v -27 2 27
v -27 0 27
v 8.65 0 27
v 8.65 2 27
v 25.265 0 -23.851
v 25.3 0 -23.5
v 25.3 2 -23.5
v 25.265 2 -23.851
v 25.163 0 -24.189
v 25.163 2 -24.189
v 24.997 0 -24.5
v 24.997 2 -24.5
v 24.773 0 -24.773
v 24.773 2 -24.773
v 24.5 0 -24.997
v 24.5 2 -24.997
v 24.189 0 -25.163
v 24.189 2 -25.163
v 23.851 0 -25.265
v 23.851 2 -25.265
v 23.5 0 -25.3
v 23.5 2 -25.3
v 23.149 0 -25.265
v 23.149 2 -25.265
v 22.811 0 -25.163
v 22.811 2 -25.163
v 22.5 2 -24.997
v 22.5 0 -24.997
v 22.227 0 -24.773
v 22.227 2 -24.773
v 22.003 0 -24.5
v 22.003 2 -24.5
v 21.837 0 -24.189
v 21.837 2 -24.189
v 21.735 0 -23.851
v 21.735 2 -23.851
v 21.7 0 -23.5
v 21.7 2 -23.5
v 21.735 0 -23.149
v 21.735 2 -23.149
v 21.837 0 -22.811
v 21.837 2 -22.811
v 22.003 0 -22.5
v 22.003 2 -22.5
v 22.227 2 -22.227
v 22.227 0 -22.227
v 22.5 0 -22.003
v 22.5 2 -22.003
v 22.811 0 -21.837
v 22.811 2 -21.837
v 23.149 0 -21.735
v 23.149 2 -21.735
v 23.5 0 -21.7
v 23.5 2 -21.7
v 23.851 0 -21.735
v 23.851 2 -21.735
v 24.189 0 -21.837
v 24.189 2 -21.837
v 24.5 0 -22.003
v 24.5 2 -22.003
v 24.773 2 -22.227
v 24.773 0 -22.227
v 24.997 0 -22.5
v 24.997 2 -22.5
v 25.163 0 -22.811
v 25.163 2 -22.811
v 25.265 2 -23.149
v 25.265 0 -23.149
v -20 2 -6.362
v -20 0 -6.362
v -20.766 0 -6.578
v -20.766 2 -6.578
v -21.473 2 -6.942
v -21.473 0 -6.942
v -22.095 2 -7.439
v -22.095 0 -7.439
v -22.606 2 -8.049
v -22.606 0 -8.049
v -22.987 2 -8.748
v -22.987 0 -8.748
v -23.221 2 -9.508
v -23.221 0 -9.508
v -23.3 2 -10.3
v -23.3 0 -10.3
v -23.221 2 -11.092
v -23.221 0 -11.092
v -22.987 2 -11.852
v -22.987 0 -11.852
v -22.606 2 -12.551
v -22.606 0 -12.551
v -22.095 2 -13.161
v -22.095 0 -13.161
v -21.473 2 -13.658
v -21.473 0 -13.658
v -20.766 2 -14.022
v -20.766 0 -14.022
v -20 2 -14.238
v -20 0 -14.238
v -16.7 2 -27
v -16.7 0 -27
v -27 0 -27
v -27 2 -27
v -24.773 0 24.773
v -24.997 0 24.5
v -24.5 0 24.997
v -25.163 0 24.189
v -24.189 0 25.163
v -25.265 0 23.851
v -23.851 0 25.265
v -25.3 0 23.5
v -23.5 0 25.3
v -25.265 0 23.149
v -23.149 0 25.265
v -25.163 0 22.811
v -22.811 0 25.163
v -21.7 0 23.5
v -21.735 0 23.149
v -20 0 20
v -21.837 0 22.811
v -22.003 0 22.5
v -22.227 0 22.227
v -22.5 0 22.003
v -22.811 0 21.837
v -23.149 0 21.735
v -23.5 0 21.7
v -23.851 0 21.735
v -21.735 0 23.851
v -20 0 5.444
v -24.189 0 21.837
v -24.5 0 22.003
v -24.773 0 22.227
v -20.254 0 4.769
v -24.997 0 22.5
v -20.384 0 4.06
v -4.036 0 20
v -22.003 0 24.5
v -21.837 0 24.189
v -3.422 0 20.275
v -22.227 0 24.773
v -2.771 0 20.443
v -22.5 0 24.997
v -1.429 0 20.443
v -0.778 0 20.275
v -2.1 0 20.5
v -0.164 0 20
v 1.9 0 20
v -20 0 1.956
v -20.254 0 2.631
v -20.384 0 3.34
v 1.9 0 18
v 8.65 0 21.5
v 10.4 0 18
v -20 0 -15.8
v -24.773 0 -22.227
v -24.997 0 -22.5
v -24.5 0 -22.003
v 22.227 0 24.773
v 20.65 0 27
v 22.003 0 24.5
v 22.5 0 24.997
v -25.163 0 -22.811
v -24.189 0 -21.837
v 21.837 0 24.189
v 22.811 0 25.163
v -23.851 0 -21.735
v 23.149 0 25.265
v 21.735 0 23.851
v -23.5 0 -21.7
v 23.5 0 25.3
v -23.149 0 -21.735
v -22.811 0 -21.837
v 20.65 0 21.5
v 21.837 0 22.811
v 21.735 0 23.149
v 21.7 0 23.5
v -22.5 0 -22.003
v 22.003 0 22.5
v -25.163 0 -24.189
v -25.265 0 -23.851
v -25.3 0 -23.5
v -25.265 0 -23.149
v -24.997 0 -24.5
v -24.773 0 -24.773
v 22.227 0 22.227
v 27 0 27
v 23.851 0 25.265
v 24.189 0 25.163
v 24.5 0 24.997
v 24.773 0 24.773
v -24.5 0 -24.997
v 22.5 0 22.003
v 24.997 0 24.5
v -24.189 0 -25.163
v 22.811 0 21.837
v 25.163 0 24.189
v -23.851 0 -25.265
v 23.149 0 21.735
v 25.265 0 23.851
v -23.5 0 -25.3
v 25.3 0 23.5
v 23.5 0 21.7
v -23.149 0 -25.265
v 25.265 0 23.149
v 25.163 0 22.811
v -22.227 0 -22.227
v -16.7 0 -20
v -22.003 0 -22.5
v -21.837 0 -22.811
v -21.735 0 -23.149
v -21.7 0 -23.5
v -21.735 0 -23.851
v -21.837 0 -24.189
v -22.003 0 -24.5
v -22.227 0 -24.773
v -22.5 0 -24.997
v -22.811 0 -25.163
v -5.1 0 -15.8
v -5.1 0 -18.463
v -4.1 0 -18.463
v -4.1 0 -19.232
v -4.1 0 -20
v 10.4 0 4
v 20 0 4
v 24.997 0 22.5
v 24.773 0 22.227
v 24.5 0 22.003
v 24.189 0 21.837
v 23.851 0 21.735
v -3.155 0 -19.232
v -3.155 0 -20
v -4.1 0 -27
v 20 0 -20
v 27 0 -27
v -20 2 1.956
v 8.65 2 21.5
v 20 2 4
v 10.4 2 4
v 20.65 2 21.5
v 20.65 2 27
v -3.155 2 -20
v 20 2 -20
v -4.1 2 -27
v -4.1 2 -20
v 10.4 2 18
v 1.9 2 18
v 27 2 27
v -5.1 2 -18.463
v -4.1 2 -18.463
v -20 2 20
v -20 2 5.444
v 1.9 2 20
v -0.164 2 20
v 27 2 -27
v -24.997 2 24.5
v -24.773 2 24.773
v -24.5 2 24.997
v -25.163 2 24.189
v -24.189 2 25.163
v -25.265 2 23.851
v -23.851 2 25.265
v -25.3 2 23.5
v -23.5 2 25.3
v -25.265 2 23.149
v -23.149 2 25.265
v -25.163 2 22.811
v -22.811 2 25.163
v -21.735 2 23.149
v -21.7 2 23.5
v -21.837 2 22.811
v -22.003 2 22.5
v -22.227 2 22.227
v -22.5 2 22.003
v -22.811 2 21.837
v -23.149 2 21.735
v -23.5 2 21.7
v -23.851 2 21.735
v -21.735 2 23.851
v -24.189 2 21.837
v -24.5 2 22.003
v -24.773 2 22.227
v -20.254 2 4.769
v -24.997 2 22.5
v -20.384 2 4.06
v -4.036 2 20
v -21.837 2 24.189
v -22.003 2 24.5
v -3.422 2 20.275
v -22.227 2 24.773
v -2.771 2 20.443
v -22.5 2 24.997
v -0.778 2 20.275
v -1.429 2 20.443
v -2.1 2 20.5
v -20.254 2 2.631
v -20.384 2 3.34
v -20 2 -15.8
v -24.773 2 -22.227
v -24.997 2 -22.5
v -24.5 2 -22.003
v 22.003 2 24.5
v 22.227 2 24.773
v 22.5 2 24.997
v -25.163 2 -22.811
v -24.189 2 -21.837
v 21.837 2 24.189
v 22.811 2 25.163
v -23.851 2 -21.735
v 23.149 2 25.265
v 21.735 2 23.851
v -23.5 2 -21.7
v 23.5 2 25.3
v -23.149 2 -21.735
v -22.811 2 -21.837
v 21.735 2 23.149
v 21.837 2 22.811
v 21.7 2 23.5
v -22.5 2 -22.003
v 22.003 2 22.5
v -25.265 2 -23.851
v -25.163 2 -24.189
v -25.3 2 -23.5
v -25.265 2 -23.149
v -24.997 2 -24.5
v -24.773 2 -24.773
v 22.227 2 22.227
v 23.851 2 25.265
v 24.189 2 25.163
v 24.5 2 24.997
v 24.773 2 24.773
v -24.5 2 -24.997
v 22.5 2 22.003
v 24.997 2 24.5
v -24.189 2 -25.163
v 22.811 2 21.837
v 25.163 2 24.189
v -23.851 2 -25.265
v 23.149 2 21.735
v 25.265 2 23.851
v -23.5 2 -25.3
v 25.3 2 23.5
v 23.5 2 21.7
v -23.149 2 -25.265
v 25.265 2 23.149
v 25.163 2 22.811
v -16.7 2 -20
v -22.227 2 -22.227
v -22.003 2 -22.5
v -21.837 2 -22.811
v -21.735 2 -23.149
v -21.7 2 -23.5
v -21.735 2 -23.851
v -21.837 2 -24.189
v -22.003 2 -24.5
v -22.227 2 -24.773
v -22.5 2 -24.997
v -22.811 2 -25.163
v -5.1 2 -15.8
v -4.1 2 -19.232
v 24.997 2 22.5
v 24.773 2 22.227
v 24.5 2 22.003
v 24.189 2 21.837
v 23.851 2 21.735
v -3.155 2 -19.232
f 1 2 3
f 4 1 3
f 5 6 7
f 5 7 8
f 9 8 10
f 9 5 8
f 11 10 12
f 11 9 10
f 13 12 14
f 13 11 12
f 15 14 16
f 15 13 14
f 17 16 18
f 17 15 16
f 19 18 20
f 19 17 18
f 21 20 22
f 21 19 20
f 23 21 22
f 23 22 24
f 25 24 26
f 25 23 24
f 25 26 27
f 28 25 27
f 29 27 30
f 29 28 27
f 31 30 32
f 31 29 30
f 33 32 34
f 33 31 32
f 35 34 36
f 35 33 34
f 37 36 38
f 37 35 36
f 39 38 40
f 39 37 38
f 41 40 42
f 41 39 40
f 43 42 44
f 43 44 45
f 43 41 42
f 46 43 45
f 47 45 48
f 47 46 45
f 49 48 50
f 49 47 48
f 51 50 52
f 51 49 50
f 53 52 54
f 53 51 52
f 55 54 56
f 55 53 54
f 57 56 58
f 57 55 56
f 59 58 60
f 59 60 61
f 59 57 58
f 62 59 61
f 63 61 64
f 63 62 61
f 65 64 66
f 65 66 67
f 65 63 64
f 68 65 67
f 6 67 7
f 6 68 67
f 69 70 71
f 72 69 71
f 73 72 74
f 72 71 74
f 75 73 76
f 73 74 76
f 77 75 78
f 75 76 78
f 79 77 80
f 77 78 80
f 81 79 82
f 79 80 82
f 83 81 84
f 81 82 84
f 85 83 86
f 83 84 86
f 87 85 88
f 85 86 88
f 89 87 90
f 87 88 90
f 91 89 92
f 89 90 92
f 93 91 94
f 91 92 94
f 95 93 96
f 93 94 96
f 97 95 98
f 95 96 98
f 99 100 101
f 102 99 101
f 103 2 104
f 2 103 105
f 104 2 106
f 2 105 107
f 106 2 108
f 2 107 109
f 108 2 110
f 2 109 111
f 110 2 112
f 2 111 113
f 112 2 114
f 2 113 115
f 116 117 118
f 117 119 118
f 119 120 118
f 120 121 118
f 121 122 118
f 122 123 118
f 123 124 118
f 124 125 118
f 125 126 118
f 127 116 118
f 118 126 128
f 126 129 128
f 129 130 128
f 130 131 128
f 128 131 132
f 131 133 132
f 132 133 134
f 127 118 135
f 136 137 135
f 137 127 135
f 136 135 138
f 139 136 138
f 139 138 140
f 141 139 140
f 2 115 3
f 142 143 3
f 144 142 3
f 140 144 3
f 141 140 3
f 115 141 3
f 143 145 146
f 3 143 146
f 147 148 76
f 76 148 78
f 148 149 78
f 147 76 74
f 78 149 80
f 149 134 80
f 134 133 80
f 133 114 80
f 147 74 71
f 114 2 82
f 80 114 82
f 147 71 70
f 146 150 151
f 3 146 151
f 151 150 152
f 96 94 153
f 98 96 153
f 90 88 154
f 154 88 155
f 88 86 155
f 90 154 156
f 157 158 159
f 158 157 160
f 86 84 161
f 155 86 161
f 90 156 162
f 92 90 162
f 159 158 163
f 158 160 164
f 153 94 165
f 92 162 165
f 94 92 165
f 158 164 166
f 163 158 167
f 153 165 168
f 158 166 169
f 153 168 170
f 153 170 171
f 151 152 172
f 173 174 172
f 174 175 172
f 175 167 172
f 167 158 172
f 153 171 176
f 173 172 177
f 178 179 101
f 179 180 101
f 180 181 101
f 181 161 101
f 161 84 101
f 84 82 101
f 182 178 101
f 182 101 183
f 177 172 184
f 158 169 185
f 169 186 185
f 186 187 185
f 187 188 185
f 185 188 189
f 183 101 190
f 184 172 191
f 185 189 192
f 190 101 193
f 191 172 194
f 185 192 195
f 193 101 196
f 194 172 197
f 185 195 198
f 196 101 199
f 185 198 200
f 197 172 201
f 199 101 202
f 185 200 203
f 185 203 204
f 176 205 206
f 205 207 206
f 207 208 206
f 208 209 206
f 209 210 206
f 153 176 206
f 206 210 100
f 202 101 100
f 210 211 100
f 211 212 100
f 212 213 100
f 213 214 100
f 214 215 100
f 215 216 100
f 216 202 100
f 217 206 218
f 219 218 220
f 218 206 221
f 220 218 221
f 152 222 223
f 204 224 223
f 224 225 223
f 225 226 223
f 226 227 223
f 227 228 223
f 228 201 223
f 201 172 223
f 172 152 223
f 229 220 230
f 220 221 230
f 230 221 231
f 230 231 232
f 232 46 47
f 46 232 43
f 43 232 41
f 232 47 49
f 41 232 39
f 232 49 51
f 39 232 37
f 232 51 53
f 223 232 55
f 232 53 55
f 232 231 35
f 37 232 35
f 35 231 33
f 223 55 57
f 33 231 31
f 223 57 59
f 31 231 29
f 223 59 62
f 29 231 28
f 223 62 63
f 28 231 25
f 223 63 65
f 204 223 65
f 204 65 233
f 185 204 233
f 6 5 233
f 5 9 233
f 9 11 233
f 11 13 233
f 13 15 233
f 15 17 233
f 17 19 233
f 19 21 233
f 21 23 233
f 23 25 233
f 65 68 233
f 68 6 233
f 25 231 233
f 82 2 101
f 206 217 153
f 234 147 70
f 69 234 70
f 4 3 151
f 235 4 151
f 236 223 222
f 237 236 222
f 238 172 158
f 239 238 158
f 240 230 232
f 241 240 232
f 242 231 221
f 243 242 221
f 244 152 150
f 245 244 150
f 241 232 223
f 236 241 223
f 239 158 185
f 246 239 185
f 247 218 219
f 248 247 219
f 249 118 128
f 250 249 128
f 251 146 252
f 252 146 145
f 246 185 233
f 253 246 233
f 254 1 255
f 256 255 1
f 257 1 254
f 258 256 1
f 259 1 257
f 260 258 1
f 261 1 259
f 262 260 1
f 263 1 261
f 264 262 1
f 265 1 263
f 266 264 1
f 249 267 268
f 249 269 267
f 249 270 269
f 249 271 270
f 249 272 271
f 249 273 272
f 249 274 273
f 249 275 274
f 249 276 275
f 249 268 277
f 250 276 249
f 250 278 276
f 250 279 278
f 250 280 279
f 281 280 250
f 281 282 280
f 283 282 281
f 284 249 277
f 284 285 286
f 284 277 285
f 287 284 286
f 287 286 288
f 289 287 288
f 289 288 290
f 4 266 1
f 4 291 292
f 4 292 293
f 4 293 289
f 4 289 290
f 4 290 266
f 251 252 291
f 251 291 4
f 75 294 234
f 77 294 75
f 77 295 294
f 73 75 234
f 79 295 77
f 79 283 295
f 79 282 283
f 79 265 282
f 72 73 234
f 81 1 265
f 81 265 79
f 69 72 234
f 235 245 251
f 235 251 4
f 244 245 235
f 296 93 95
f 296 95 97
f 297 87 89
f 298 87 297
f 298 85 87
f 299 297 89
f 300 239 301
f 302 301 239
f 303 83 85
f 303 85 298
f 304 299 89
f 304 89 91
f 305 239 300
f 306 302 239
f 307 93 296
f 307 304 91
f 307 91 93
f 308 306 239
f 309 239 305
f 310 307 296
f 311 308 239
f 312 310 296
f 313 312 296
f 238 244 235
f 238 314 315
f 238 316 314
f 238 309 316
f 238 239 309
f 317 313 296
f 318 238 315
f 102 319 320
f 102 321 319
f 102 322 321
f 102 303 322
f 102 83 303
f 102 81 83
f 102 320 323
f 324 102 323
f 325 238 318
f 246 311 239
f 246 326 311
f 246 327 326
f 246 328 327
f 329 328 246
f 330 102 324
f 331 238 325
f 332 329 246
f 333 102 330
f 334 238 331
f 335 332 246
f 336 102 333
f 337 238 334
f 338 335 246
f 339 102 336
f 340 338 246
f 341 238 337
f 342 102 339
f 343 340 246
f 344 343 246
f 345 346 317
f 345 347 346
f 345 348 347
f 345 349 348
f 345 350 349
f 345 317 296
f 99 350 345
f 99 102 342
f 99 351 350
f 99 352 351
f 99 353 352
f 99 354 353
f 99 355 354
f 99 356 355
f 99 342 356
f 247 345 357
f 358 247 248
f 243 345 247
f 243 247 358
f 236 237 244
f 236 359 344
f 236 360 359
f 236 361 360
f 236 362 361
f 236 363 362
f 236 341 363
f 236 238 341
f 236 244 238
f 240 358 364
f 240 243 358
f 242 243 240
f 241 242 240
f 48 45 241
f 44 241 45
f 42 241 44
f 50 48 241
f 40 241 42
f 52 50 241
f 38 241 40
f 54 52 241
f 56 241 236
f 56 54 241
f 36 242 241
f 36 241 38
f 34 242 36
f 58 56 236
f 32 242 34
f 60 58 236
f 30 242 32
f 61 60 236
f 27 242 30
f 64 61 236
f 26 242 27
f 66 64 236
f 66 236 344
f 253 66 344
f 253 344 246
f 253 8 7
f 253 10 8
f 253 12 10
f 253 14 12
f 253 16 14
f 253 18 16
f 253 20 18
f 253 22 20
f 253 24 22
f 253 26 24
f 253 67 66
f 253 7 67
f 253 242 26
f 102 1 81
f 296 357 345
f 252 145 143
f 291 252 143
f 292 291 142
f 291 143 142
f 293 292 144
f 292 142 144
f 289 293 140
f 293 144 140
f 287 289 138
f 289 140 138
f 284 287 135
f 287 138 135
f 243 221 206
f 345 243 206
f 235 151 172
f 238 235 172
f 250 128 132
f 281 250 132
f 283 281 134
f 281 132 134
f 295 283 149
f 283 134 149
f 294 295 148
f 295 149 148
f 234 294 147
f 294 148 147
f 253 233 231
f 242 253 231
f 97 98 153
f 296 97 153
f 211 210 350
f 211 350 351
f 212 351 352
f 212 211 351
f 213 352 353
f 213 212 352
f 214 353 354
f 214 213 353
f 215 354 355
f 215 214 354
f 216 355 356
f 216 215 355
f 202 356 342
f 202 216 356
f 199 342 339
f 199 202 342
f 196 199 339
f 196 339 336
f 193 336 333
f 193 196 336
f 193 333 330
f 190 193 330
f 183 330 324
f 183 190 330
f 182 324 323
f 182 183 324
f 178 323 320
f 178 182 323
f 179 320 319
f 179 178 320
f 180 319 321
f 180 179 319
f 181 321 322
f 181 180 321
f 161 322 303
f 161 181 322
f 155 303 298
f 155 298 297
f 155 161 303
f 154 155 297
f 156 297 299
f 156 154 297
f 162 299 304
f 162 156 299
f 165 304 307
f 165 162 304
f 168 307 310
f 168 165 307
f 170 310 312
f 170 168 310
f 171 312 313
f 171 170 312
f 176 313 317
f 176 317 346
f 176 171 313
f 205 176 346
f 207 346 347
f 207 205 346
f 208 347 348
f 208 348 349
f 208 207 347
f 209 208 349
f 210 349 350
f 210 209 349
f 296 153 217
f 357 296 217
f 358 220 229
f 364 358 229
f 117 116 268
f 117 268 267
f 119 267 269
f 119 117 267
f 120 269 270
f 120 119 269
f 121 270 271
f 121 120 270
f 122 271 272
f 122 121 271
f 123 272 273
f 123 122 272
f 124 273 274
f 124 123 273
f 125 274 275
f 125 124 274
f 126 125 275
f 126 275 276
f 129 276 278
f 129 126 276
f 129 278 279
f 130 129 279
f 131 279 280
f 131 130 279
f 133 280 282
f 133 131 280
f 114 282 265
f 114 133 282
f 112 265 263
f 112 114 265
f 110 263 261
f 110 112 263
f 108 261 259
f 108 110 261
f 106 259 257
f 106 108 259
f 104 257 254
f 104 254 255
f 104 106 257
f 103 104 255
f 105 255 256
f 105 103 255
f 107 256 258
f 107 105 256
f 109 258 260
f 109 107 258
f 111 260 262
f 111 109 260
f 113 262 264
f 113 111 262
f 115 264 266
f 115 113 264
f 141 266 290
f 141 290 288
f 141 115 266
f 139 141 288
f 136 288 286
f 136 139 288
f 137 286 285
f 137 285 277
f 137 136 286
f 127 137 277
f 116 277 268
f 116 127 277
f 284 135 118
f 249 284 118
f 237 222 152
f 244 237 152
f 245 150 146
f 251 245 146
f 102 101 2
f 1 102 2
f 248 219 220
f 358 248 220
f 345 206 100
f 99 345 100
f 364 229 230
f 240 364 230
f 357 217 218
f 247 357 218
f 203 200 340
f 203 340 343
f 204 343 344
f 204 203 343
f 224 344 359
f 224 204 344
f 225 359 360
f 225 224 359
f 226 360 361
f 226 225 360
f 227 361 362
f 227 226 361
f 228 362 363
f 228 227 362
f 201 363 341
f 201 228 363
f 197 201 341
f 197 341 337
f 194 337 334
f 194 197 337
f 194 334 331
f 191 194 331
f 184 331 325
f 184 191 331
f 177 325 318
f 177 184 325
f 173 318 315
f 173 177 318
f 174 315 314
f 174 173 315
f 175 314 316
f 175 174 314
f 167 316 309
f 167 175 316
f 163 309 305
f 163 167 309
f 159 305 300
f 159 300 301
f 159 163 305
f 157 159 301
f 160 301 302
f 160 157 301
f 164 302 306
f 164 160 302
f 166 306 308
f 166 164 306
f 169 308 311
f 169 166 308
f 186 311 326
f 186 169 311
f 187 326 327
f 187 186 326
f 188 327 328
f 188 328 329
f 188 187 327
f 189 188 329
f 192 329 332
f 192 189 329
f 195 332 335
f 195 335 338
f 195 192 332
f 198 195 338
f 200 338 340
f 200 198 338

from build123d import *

# Parameters (mm, degrees)
SKETCH_3_R      = 1.8
SKETCH_3_W      = 0.8
SKETCH_3_H      = 1.5
SKETCH_3_W_2    = 1
SKETCH_3_W_3    = 0.944853381
SKETCH_3_H_2    = 0.76832805
EXTRUDE_2_DEPTH = 2


with BuildPart() as part:
    # 草图3 → 凸台-拉伸2 (new body)
    with BuildSketch(Plane(origin=(0, 0, 0), x_dir=(1, 0, 0), z_dir=(0, 1, 0))):
        with BuildLine():
            Line((8.65, -27), (8.65, -21.5))
            Line((8.65, -21.5), (8.65, -20))
            Line((8.65, -20), (1.9, -20))
            Line((1.9, -20), (-0.163508327, -20))
            ThreePointArc((-0.163508327, -20), (-2.1, -20.5), (-4.036491673, -20))
            Line((-4.036491673, -20), (-20, -20))
            Line((-20, -20), (-20, -5.443559577))
            ThreePointArc((-20, -5.443559577), (-20.4, -3.7), (-20, -1.956440423))
            Line((-20, -1.956440423), (-20, 6.361726266))
            ThreePointArc((-20, 6.361726266), (-23.3, 10.3), (-20, 14.238273734))
            Line((-20, 14.238273734), (-20, 15.8))
            Line((-20, 15.8), (-20, 20))
            Line((-20, 20), (-16.7, 20))
            Line((-16.7, 20), (-16.7, 27))
            Line((-16.7, 27), (-27, 27))
            Line((-27, 27), (-27, -27))
            Line((-27, -27), (8.65, -27))
        make_face()
        with Locations((-23.5, -23.5)):
            Circle(SKETCH_3_R, mode=Mode.SUBTRACT)
        with Locations((-23.5, 23.5)):
            Circle(SKETCH_3_R, mode=Mode.SUBTRACT)
        Polygon((20, -18), (20, -20), (20.65, -20), (20.65, -21.5), (20.65, -27), (27, -27), (27, 27), (-4.1, 27), (-4.1, 20), (-3.155146619, 20), (20, 20), (20, -4), align=None)
        with Locations((23.5, -23.5)):
            Circle(SKETCH_3_R, mode=Mode.SUBTRACT)
        with Locations((23.5, 23.5)):
            Circle(SKETCH_3_R, mode=Mode.SUBTRACT)
        Polygon((12.4, -20), (12.4, -19.5), (12.4, -18), (10.4, -18), (1.9, -18), (1.9, -20), (8.65, -20), align=None)
        Polygon((20, -20), (16.9, -20), (16.9, -19.5), (16.1, -19.5), (13.4, -19.5), (12.4, -19.5), (12.4, -20), (8.65, -20), (8.65, -21.5), (20.65, -21.5), (20.65, -20), align=None)
        Polygon((16.9, -19.5), (16.9, -20), (20, -20), (20, -18), (16.9, -18), align=None)
        with Locations((16.5, -18.75)):
            Rectangle(SKETCH_3_W, SKETCH_3_H)
        with Locations((12.9, -18.75)):
            Rectangle(SKETCH_3_W_2, SKETCH_3_H)
        Polygon((16.1, -18), (16.9, -18), (16.9, -6), (12.4, -6), (12.4, -18), (13.4, -18), (13.4, -19.5), (16.1, -19.5), align=None)
        Polygon((16.9, -18), (20, -18), (20, -4), (10.4, -4), (10.4, -6), (10.4, -18), (12.4, -18), (12.4, -6), (16.9, -6), align=None)
        with Locations((-3.62757331, 19.615835975)):
            Rectangle(SKETCH_3_W_3, SKETCH_3_H_2)
        Polygon((-4.1, 19.23167195), (-4.1, 20), (-10.4, 20), (-16.7, 20), (-20, 20), (-20, 15.8), (-5.1, 15.8), (-5.1, 18.463343901), (-4.1, 18.463343901), align=None)
    extrude(amount=EXTRUDE_2_DEPTH)


solid = part.part
